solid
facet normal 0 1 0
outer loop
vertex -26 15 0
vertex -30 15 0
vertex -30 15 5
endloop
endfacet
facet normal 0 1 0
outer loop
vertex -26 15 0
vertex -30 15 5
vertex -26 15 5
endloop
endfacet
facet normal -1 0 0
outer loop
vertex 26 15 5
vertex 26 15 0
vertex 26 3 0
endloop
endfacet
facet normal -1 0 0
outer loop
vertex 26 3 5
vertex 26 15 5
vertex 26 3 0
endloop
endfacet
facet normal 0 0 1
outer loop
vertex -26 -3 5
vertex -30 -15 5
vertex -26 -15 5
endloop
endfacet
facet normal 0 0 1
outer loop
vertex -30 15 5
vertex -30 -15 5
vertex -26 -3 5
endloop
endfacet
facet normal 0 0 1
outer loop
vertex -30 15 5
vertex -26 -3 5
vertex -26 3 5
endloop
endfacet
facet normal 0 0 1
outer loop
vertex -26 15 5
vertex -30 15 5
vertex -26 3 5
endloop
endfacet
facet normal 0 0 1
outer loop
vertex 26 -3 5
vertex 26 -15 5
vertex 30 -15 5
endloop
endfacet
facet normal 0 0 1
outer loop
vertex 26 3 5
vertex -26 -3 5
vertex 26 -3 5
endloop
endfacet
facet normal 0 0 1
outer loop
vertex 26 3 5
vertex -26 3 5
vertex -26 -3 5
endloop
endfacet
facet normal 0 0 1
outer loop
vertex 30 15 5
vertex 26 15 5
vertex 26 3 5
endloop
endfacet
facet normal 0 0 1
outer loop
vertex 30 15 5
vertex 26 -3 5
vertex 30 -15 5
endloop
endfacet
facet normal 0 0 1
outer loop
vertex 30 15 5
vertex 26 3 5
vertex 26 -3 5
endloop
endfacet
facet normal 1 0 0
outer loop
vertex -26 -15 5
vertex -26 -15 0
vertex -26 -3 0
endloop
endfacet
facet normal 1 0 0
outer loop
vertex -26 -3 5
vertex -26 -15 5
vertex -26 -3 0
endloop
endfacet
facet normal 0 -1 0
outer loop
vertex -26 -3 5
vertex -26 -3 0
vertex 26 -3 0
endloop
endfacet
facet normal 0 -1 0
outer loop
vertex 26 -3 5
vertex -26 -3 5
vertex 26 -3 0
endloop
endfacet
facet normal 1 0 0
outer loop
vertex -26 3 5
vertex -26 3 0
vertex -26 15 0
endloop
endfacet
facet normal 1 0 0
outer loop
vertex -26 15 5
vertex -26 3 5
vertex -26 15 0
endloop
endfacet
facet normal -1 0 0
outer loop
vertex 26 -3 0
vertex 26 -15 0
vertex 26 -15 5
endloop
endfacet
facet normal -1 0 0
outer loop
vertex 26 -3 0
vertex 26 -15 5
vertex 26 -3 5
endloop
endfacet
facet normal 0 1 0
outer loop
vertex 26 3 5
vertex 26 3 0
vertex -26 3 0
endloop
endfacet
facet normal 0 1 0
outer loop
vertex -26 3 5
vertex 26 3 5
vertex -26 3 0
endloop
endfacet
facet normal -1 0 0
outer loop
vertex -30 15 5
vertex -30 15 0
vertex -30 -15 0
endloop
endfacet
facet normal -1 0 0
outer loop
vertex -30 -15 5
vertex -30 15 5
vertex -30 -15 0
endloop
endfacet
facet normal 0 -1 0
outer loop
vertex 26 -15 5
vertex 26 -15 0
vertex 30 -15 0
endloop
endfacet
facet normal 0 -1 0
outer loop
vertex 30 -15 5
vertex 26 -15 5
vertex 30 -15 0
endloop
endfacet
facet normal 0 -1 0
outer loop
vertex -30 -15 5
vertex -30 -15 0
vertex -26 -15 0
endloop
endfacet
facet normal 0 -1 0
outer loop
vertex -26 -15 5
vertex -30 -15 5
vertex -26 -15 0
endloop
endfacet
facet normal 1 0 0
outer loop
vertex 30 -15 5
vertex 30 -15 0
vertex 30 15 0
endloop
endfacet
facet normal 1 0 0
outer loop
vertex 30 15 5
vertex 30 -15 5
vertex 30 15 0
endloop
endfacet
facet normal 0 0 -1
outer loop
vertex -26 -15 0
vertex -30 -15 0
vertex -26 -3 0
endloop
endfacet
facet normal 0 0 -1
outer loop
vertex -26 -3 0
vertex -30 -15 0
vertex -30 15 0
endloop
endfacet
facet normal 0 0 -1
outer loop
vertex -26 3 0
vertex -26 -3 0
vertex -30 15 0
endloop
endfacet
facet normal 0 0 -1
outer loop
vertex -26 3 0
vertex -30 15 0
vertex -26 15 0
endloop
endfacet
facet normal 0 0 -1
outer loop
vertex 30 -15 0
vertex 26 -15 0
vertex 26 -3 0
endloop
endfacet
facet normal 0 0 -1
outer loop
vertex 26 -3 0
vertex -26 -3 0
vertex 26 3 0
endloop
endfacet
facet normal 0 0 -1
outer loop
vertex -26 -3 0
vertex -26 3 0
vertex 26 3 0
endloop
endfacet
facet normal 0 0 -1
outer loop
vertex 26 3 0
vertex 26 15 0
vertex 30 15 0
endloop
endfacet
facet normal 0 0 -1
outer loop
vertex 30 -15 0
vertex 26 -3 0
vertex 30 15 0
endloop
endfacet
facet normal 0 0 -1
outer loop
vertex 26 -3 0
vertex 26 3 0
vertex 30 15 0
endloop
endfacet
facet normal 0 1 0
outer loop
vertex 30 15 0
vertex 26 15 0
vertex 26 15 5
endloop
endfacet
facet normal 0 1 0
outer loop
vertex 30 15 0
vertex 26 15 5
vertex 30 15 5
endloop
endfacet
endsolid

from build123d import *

# Parameters (mm, degrees)
F0_W     = 4
F0_H     = 6
F0_H_2   = 12
F0_W_2   = 52
F1_DEPTH = 5


with BuildPart() as f1:
    # F0 (on Top) → F1 (new body)
    with BuildSketch(Plane.XY):
        with Locations((28, 0)):
            Rectangle(F0_W, F0_H)
        with Locations((28, 9)):
            Rectangle(F0_W, F0_H_2)
        Rectangle(F0_W_2, F0_H)
        with Locations((28, -9)):
            Rectangle(F0_W, F0_H_2)
        with Locations((-28, 0)):
            Rectangle(F0_W, F0_H)
        with Locations((-28, 9)):
            Rectangle(F0_W, F0_H_2)
        with Locations((-28, -9)):
            Rectangle(F0_W, F0_H_2)
    extrude(amount=F1_DEPTH)


solid = f1.part
